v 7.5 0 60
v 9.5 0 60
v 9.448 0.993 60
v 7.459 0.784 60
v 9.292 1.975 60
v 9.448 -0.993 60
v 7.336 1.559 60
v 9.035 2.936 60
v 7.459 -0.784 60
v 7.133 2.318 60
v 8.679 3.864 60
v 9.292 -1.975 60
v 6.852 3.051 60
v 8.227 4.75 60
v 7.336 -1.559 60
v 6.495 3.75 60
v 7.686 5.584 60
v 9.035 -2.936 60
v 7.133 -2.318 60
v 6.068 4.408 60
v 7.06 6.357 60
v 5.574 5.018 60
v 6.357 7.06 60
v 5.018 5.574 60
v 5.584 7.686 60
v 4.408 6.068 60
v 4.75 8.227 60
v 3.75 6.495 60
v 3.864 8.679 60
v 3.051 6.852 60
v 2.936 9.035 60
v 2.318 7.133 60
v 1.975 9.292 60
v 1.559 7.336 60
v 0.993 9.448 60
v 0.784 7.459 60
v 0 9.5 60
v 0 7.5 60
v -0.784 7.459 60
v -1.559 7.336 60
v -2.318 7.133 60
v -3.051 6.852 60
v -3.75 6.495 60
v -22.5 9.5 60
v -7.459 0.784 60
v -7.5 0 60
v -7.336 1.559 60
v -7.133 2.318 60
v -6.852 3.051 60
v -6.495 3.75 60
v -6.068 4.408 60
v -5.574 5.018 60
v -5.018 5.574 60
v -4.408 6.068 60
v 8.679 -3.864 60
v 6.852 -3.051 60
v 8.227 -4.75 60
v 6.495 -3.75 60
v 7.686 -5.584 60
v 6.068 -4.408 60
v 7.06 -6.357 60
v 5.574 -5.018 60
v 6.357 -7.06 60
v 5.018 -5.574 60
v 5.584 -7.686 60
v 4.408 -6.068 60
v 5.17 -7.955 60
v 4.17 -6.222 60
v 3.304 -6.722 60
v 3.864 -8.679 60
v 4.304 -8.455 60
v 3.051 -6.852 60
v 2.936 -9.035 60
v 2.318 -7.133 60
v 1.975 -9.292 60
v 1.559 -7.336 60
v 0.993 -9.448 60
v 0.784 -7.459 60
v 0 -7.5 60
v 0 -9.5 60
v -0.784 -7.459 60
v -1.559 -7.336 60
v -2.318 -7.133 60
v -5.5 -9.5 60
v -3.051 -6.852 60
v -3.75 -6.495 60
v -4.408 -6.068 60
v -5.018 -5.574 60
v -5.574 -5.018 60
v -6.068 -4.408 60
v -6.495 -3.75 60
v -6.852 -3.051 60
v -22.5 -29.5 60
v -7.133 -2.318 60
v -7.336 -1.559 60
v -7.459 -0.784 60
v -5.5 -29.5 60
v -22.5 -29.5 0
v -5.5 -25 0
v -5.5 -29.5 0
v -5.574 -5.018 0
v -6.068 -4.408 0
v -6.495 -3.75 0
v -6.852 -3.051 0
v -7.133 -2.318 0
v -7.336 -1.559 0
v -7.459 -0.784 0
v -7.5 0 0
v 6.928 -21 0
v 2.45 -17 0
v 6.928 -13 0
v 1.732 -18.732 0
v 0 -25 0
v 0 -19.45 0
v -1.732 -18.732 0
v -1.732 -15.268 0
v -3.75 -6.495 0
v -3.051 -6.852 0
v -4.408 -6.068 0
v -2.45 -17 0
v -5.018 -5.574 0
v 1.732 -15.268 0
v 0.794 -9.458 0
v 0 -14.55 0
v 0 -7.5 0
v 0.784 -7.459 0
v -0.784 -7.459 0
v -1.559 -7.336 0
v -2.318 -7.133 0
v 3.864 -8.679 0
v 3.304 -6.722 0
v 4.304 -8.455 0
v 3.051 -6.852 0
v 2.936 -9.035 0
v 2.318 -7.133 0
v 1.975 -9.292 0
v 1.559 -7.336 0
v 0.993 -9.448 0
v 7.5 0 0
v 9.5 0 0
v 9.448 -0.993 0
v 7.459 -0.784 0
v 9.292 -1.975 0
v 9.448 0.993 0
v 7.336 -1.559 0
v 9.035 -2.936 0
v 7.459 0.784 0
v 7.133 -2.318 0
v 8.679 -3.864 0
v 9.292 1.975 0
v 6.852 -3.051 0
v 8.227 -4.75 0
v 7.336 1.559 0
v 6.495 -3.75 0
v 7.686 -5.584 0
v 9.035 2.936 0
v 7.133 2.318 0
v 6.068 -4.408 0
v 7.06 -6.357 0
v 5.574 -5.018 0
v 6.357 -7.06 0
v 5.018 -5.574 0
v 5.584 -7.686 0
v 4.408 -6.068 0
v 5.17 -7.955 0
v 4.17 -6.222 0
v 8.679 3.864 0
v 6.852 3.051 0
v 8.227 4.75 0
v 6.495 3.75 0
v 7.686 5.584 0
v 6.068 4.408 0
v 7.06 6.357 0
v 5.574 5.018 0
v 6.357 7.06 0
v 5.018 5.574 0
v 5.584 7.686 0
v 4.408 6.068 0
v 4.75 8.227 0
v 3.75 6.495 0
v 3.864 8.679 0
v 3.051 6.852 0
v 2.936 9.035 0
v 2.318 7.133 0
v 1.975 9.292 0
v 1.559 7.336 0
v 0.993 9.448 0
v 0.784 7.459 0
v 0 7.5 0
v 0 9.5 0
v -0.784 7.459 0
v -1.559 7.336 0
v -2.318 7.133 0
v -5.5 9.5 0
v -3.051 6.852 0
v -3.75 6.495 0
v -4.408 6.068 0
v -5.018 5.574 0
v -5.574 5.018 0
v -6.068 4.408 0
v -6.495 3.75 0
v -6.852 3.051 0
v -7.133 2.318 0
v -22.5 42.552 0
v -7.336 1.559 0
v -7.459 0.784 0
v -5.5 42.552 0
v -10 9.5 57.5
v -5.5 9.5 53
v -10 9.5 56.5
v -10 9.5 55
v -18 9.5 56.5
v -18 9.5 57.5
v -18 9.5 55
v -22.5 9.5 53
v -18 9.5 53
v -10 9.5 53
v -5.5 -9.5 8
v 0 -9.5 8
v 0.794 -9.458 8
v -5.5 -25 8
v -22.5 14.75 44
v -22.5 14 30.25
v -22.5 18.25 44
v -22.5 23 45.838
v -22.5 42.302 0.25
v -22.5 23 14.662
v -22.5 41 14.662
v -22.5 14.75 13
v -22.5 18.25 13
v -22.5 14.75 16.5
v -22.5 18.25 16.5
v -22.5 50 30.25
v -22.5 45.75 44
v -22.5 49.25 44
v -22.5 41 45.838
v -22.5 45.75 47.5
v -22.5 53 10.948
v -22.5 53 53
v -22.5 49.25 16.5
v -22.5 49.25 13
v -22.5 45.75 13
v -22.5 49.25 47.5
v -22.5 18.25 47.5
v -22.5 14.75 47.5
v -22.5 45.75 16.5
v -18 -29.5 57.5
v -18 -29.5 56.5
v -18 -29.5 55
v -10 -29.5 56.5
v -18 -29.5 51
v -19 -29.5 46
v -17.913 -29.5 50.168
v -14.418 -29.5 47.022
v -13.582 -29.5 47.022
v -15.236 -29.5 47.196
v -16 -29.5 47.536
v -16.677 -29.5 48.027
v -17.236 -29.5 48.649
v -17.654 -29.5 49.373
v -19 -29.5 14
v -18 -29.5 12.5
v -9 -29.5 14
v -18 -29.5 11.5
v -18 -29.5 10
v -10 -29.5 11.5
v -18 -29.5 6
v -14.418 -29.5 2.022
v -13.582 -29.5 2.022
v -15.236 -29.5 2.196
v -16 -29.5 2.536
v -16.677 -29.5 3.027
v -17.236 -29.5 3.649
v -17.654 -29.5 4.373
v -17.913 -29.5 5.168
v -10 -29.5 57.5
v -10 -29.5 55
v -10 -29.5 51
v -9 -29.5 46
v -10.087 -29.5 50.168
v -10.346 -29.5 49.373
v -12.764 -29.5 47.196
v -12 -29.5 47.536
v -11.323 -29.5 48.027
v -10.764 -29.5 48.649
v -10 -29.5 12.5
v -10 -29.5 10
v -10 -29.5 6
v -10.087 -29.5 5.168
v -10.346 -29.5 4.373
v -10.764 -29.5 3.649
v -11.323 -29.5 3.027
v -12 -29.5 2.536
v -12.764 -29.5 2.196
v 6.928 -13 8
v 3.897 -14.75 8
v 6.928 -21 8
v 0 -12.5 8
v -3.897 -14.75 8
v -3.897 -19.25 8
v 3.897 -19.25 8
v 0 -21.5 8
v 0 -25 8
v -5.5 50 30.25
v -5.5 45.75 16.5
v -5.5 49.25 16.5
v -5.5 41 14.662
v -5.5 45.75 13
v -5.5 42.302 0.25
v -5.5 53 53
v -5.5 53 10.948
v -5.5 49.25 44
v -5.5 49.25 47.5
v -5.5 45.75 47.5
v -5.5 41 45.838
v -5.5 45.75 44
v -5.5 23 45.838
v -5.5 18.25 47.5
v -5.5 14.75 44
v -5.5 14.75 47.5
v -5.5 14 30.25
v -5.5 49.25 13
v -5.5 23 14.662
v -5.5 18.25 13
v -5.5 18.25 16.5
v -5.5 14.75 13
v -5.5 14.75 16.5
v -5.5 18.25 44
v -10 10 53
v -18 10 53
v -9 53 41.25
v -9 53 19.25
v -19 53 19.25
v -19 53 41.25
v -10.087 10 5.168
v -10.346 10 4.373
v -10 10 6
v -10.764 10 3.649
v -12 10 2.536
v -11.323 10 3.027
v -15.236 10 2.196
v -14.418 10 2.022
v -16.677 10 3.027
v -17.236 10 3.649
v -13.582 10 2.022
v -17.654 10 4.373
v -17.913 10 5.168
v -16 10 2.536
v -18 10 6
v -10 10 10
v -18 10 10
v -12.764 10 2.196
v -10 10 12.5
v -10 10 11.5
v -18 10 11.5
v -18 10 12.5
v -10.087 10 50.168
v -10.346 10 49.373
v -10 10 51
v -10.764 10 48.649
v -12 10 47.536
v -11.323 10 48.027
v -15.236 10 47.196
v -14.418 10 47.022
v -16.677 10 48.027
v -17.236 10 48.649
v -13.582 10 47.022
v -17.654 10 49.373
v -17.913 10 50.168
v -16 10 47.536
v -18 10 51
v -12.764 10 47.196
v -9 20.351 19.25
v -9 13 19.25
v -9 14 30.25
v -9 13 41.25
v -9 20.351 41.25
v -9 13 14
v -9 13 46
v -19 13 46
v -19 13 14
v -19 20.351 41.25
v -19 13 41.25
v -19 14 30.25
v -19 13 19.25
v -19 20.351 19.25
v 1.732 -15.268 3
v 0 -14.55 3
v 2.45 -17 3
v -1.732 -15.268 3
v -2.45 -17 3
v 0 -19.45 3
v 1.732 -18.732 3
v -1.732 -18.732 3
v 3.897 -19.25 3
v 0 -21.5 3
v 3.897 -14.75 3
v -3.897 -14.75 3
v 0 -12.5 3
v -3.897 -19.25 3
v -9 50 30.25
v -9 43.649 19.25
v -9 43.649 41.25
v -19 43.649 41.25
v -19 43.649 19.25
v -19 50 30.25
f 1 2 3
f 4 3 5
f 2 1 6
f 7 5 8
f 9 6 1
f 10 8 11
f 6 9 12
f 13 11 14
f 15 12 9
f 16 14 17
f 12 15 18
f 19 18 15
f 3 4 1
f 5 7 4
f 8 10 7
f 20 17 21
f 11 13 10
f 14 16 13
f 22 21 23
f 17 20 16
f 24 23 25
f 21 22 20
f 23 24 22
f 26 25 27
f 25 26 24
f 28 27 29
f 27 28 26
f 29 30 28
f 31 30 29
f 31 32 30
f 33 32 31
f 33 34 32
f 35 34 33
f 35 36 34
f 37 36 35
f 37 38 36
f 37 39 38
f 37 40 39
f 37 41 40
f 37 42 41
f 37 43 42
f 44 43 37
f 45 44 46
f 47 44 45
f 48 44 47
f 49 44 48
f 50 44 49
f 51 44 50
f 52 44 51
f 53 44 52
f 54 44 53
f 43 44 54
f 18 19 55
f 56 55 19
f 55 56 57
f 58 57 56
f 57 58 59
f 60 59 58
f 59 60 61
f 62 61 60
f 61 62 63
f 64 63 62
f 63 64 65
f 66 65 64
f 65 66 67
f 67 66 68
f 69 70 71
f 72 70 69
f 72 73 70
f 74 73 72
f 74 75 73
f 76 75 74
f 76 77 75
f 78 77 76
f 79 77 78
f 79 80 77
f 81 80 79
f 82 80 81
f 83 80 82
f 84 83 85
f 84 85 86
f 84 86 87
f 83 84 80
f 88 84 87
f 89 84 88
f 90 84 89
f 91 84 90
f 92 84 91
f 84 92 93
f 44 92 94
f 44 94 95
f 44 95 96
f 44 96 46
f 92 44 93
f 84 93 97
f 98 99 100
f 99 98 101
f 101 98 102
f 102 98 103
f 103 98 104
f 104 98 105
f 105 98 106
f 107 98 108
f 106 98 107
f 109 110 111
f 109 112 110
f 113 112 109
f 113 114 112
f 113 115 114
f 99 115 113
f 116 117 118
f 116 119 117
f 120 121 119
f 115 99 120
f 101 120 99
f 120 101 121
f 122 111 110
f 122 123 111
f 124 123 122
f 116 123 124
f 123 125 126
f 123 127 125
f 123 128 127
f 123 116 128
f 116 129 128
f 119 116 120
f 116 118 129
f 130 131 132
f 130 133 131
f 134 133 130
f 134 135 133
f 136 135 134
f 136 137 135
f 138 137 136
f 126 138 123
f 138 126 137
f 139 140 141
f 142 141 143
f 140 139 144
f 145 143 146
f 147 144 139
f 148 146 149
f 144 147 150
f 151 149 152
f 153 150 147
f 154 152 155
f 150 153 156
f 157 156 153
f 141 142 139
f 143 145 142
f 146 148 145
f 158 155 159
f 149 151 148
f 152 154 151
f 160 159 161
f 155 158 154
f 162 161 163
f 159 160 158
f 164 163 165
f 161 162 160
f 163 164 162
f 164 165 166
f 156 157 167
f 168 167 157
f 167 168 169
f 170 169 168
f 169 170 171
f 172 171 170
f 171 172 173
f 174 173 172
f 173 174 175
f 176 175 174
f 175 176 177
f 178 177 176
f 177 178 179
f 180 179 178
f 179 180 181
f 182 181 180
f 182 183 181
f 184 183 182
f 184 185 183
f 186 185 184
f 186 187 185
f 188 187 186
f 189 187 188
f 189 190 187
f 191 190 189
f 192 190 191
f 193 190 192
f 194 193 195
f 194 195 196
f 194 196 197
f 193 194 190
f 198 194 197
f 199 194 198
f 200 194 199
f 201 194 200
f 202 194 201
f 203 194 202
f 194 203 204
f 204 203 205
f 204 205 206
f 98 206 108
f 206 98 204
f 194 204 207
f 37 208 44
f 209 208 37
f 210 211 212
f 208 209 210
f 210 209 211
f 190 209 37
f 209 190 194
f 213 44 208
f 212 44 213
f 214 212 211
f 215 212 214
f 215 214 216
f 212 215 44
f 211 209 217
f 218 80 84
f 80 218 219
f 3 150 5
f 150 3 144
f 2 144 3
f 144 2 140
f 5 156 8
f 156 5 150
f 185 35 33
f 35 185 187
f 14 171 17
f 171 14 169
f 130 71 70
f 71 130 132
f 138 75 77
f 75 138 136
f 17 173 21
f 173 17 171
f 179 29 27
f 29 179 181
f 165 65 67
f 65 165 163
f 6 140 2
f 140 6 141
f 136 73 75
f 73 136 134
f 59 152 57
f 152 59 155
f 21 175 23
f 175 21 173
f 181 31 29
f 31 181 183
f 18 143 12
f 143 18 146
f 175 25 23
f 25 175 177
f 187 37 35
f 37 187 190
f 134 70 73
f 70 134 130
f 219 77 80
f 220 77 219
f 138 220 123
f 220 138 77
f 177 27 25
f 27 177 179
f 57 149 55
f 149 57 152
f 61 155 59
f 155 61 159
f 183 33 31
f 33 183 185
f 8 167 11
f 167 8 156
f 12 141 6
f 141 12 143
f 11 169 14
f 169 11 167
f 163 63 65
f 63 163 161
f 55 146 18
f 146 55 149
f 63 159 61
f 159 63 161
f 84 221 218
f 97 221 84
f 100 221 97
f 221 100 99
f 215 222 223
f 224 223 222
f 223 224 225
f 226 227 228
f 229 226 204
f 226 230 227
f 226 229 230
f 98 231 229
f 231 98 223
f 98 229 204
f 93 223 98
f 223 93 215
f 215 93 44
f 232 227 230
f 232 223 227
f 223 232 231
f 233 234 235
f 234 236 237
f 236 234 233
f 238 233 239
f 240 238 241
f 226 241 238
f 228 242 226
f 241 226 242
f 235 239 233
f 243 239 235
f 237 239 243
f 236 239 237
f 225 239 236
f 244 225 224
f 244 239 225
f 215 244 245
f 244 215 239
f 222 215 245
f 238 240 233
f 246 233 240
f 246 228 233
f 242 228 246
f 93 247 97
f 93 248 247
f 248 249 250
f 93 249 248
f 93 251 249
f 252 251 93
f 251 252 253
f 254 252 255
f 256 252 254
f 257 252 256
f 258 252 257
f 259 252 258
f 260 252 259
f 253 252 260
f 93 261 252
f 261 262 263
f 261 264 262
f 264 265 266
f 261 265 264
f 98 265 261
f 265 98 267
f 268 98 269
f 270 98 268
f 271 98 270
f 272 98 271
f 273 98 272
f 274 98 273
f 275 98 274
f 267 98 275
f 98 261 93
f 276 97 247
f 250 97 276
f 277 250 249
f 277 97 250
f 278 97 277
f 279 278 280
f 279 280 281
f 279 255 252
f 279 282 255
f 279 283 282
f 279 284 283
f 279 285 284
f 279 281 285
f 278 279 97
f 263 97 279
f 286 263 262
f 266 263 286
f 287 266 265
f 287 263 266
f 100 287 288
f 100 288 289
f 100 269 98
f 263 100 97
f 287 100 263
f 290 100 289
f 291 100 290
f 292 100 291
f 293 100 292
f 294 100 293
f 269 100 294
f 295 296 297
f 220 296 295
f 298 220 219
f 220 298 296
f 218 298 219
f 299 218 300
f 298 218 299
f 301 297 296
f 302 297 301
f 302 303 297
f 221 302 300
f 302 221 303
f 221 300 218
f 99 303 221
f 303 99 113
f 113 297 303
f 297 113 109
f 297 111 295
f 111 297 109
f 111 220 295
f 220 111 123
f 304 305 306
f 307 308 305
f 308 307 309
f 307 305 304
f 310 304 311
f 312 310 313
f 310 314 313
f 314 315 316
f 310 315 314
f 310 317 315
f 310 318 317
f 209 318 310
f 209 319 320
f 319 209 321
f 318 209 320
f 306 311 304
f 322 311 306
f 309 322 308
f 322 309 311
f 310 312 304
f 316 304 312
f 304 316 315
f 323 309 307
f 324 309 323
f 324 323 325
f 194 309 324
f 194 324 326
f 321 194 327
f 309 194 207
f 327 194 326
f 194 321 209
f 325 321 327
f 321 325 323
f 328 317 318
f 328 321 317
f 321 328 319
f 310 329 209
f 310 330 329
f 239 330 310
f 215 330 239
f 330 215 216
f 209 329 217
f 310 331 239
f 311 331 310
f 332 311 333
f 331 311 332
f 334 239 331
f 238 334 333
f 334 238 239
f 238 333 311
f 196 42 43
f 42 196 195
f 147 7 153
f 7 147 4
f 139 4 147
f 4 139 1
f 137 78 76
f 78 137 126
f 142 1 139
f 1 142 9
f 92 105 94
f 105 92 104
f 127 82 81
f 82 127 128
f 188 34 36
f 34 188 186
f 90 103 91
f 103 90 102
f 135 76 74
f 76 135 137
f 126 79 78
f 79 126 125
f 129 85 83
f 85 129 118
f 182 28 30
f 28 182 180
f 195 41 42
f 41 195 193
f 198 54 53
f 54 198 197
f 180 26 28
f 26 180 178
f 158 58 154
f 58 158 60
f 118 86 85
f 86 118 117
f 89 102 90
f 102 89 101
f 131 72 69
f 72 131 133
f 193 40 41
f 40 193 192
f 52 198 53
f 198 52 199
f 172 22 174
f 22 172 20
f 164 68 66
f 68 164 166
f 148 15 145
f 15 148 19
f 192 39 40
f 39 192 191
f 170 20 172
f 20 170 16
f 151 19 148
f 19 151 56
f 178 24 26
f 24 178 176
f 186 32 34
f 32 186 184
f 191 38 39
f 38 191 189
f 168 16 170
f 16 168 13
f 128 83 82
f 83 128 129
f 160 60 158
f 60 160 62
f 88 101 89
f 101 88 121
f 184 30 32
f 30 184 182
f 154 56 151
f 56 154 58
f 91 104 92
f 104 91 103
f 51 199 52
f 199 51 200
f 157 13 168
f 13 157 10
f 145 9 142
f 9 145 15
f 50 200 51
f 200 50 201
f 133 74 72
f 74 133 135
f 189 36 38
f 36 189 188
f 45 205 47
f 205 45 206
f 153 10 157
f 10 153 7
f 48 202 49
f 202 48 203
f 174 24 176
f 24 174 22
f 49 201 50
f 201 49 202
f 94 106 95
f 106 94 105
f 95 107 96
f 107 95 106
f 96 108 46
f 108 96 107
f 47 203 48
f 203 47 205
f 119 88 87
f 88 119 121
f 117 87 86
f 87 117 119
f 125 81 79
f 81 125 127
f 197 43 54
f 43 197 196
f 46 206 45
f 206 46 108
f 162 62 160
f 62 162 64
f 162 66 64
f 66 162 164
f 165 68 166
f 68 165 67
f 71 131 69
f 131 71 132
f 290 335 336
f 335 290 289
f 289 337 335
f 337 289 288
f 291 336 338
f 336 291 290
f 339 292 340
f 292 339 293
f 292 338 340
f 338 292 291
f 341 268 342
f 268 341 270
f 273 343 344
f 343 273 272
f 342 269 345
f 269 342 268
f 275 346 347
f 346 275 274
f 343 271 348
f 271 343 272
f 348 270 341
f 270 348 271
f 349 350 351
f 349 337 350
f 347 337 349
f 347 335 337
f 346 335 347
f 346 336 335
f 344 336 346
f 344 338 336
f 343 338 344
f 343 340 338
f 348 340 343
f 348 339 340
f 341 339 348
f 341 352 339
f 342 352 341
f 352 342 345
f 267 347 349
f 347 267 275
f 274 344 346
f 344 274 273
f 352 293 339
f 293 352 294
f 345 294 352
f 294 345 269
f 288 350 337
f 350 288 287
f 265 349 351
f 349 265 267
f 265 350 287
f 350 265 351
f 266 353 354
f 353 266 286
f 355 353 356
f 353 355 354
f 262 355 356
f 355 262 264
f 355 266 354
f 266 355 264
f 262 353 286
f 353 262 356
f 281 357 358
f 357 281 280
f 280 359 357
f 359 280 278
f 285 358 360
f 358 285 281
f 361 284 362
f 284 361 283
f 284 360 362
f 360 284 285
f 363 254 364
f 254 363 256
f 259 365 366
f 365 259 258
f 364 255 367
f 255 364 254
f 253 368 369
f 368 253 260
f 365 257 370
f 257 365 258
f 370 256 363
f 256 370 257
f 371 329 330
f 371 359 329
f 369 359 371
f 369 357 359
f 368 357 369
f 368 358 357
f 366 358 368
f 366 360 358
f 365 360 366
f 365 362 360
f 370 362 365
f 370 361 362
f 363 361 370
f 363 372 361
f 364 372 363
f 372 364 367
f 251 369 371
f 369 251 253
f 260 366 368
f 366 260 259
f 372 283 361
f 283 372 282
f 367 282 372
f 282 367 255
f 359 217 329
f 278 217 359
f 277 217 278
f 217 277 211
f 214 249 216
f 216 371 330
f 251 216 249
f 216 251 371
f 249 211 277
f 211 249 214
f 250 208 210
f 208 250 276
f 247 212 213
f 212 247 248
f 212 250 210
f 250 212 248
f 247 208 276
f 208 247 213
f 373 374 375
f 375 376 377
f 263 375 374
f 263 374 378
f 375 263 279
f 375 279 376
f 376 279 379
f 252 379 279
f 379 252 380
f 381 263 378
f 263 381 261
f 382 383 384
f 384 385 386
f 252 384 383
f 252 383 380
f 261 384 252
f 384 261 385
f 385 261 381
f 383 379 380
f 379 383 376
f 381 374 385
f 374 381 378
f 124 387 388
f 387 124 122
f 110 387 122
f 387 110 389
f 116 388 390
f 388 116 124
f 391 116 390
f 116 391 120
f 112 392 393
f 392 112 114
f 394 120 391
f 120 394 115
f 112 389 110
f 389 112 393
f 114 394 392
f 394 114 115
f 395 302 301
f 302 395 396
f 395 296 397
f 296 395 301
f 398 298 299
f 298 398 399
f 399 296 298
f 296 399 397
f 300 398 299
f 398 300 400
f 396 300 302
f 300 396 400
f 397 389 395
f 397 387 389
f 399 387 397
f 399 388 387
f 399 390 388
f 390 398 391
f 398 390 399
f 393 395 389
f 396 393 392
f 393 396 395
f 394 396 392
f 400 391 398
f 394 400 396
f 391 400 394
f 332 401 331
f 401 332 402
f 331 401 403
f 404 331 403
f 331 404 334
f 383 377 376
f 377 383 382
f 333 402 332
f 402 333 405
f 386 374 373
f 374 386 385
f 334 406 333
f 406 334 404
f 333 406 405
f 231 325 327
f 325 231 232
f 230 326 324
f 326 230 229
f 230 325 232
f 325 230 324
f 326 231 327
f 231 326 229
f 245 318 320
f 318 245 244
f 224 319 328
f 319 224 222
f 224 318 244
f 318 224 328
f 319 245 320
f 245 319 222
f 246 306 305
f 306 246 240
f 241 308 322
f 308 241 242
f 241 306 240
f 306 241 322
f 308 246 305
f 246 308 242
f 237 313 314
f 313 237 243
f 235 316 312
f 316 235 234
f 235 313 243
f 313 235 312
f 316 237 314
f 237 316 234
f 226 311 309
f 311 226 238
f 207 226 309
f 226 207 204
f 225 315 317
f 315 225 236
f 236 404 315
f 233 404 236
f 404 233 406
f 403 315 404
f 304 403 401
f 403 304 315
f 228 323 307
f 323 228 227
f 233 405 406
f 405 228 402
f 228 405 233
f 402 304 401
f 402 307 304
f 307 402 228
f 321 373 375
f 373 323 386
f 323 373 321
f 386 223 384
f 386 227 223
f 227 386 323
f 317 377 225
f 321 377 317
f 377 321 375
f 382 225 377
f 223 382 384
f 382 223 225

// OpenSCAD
// file: bearing.scad
// PRUSA iteration3
// Bearing holders
// GNU GPL v3
// Josef Průša <iam@josefprusa.cz> and contributors
// http://www.reprap.org/wiki/Prusa_Mendel
// http://prusamendel.org

bearing_diameter = 15;

module horizontal_bearing_base(bearings=1){
 translate(v=[0,0,6]) cube(size = [24,8+bearings*25,12], center = true);	
}
module horizontal_bearing_holes(bearings=1){
 cutter_lenght = 10+bearings*25;
 one_holder_lenght = 8+25;
 holder_lenght = 8+bearings*25;
 
 // Main bearing cut
 difference(){
  translate(v=[0,0,12]) rotate(a=[90,0,0]) translate(v=[0,0,-cutter_lenght/2]) cylinder(h = cutter_lenght, r=bearing_diameter/2, $fn=50);
  // Bearing retainers
  translate(v=[0,1-holder_lenght/2,3]) cube(size = [24,6,8], center = true);
  translate(v=[0,-1+holder_lenght/2,3]) cube(size = [24,6,8], center = true);
 }
 
 // Ziptie cutouts
 ziptie_cut_ofset = 0;
 for ( i = [0 : bearings-1] ){
  // For easier positioning I move them by half of one 
  // bearing holder then add each bearign lenght and then center again
  translate(v=[0,-holder_lenght/2,0]) translate(v=[0,one_holder_lenght/2+i*25,0]) difference(){
   union(){
    translate(v=[0,2-6,12]) rotate(a=[90,0,0]) translate(v=[0,0,0]) cylinder(h = 4, r=12.5, $fn=50);
    translate(v=[0,2+6,12]) rotate(a=[90,0,0]) translate(v=[0,0,0]) cylinder(h = 4, r=12.5, $fn=50);
   }
   translate(v=[0,10,12]) rotate(a=[90,0,0]) translate(v=[0,0,0]) cylinder(h = 24, r=10, $fn=50);
  }
 }
 
}

module horizontal_bearing_test(){
 difference(){
  horizontal_bearing_base(1);
  horizontal_bearing_holes(1);
 }
 translate(v=[30,0,0]) difference(){
  horizontal_bearing_base(2);
  horizontal_bearing_holes(2);
 }
 translate(v=[60,0,0]) difference(){
  horizontal_bearing_base(3);
  horizontal_bearing_holes(3);
 }
}



thinwall = 2;
bearing_size = bearing_diameter + 2 * thinwall;

module vertical_bearing_base(){
 translate(v=[-2-bearing_size/4,0,30]) cube(size = [4+bearing_size/2,bearing_size,60], center = true);
 cylinder(h = 60, r=bearing_size/2, $fn = 60);
}

module vertical_bearing_holes(){
  translate(v=[0,0,-1]) cylinder(h = 62, r=bearing_diameter/2, $fn = 60);
  rotate(a=[0,0,-60]) translate(v=[10,0,31]) cube(size = [10,1,62], center = true);
}

difference(){
vertical_bearing_base();
vertical_bearing_holes();
}
// file: x-end.scad
// PRUSA iteration3
// X end prototype
// GNU GPL v3
// Josef Průša <iam@josefprusa.cz> and contributors
// http://www.reprap.org/wiki/Prusa_Mendel
// http://prusamendel.org

use <bearing.scad>
rod_distance = 45;

module x_end_base(){
// Main block
translate(v=[-14,-10,30]) cube(size = [17,39,60], center = true);
// Bearing holder
vertical_bearing_base();	
//Nut trap
 // Cube
 translate(v=[-2-2,-17,4]) cube(size = [8,16,8], center = true);
 // Hexagon
 translate(v=[0,-17,0]) rotate([0,0,30]) cylinder(h = 8, r=8, $fn = 6);
}

module x_end_holes(){
vertical_bearing_holes();
// Belt hole
translate(v=[-5.5-10+1.5,-10,30]) cube(size = [10,46,32], center = true);
// Bottom pushfit rod
translate(v=[-14,-40,6]) rotate(a=[-90,0,0]) pushfit_rod(8,50);
// Top pushfit rod
translate(v=[-14,-40,rod_distance+6]) rotate(a=[-90,0,0]) pushfit_rod(8,50);
// Nut trap
 translate(v=[0,-17,-1]) cylinder(h = 10, r=2.45);
 translate(v=[0,-17,3]) rotate([0,0,30]) cylinder(h = 5, r=4.5, $fn = 6);
}


// Final prototype
module x_end_plain(){
 difference(){
  x_end_base();
  x_end_holes();
 }
}

//x_end_plain();


module pushfit_rod(diameter,length){
 cylinder(h = length, r=diameter/2, $fn=30);
 translate(v=[0,-diameter/4,length/2]) cube(size = [diameter,diameter/2,length], center = true);
 translate(v=[0,-diameter/2-2,length/2]) cube(size = [diameter,1,length], center = true);
}
// main file
// PRUSA iteration3
// X end motor
// GNU GPL v3
// Josef Průša <iam@josefprusa.cz> and contributors
// http://www.reprap.org/wiki/Prusa_Mendel
// http://prusamendel.org

use <x-end.scad>

module x_end_motor_base(){
 x_end_base();
 translate(v=[-14,31,26.5]) cube(size = [17,44,53], center = true);
}

module x_end_motor_holes(){
 x_end_holes();
 // Position to place
 translate(v=[-0,32,30.25]){
  // Belt hole
  translate(v=[-14,1,0]) cube(size = [10,46,22], center = true);
  // Motor mounting holes
  translate(v=[-10,-15.5,-15.5]) cube(size = [60,3.5,3.5], center = true);
  translate(v=[-10,-15.5,15.5]) cube(size = [60,3.5,3.5], center = true);
  translate(v=[-10,15.5,-15.5]) cube(size = [60,3.5,3.5], center = true);
  translate(v=[-10,15.5,15.5]) cube(size = [60,3.5,3.5], center = true);
  // Material saving cutout
  translate(v=[-10,40,-30]) rotate(a=[45,0,0])  cube(size = [60,42,42], center = true);
  // Motor shaft cutout
  translate(v=[0,0,0]) rotate(a=[0,-90,0]) rotate(a=[0,0,90]) cylinder(h = 80, r=18, $fn=6);
 }
}

// Final part
module x_end_motor(){
 difference(){
  x_end_motor_base();
  x_end_motor_holes();
 }
}

x_end_motor();
